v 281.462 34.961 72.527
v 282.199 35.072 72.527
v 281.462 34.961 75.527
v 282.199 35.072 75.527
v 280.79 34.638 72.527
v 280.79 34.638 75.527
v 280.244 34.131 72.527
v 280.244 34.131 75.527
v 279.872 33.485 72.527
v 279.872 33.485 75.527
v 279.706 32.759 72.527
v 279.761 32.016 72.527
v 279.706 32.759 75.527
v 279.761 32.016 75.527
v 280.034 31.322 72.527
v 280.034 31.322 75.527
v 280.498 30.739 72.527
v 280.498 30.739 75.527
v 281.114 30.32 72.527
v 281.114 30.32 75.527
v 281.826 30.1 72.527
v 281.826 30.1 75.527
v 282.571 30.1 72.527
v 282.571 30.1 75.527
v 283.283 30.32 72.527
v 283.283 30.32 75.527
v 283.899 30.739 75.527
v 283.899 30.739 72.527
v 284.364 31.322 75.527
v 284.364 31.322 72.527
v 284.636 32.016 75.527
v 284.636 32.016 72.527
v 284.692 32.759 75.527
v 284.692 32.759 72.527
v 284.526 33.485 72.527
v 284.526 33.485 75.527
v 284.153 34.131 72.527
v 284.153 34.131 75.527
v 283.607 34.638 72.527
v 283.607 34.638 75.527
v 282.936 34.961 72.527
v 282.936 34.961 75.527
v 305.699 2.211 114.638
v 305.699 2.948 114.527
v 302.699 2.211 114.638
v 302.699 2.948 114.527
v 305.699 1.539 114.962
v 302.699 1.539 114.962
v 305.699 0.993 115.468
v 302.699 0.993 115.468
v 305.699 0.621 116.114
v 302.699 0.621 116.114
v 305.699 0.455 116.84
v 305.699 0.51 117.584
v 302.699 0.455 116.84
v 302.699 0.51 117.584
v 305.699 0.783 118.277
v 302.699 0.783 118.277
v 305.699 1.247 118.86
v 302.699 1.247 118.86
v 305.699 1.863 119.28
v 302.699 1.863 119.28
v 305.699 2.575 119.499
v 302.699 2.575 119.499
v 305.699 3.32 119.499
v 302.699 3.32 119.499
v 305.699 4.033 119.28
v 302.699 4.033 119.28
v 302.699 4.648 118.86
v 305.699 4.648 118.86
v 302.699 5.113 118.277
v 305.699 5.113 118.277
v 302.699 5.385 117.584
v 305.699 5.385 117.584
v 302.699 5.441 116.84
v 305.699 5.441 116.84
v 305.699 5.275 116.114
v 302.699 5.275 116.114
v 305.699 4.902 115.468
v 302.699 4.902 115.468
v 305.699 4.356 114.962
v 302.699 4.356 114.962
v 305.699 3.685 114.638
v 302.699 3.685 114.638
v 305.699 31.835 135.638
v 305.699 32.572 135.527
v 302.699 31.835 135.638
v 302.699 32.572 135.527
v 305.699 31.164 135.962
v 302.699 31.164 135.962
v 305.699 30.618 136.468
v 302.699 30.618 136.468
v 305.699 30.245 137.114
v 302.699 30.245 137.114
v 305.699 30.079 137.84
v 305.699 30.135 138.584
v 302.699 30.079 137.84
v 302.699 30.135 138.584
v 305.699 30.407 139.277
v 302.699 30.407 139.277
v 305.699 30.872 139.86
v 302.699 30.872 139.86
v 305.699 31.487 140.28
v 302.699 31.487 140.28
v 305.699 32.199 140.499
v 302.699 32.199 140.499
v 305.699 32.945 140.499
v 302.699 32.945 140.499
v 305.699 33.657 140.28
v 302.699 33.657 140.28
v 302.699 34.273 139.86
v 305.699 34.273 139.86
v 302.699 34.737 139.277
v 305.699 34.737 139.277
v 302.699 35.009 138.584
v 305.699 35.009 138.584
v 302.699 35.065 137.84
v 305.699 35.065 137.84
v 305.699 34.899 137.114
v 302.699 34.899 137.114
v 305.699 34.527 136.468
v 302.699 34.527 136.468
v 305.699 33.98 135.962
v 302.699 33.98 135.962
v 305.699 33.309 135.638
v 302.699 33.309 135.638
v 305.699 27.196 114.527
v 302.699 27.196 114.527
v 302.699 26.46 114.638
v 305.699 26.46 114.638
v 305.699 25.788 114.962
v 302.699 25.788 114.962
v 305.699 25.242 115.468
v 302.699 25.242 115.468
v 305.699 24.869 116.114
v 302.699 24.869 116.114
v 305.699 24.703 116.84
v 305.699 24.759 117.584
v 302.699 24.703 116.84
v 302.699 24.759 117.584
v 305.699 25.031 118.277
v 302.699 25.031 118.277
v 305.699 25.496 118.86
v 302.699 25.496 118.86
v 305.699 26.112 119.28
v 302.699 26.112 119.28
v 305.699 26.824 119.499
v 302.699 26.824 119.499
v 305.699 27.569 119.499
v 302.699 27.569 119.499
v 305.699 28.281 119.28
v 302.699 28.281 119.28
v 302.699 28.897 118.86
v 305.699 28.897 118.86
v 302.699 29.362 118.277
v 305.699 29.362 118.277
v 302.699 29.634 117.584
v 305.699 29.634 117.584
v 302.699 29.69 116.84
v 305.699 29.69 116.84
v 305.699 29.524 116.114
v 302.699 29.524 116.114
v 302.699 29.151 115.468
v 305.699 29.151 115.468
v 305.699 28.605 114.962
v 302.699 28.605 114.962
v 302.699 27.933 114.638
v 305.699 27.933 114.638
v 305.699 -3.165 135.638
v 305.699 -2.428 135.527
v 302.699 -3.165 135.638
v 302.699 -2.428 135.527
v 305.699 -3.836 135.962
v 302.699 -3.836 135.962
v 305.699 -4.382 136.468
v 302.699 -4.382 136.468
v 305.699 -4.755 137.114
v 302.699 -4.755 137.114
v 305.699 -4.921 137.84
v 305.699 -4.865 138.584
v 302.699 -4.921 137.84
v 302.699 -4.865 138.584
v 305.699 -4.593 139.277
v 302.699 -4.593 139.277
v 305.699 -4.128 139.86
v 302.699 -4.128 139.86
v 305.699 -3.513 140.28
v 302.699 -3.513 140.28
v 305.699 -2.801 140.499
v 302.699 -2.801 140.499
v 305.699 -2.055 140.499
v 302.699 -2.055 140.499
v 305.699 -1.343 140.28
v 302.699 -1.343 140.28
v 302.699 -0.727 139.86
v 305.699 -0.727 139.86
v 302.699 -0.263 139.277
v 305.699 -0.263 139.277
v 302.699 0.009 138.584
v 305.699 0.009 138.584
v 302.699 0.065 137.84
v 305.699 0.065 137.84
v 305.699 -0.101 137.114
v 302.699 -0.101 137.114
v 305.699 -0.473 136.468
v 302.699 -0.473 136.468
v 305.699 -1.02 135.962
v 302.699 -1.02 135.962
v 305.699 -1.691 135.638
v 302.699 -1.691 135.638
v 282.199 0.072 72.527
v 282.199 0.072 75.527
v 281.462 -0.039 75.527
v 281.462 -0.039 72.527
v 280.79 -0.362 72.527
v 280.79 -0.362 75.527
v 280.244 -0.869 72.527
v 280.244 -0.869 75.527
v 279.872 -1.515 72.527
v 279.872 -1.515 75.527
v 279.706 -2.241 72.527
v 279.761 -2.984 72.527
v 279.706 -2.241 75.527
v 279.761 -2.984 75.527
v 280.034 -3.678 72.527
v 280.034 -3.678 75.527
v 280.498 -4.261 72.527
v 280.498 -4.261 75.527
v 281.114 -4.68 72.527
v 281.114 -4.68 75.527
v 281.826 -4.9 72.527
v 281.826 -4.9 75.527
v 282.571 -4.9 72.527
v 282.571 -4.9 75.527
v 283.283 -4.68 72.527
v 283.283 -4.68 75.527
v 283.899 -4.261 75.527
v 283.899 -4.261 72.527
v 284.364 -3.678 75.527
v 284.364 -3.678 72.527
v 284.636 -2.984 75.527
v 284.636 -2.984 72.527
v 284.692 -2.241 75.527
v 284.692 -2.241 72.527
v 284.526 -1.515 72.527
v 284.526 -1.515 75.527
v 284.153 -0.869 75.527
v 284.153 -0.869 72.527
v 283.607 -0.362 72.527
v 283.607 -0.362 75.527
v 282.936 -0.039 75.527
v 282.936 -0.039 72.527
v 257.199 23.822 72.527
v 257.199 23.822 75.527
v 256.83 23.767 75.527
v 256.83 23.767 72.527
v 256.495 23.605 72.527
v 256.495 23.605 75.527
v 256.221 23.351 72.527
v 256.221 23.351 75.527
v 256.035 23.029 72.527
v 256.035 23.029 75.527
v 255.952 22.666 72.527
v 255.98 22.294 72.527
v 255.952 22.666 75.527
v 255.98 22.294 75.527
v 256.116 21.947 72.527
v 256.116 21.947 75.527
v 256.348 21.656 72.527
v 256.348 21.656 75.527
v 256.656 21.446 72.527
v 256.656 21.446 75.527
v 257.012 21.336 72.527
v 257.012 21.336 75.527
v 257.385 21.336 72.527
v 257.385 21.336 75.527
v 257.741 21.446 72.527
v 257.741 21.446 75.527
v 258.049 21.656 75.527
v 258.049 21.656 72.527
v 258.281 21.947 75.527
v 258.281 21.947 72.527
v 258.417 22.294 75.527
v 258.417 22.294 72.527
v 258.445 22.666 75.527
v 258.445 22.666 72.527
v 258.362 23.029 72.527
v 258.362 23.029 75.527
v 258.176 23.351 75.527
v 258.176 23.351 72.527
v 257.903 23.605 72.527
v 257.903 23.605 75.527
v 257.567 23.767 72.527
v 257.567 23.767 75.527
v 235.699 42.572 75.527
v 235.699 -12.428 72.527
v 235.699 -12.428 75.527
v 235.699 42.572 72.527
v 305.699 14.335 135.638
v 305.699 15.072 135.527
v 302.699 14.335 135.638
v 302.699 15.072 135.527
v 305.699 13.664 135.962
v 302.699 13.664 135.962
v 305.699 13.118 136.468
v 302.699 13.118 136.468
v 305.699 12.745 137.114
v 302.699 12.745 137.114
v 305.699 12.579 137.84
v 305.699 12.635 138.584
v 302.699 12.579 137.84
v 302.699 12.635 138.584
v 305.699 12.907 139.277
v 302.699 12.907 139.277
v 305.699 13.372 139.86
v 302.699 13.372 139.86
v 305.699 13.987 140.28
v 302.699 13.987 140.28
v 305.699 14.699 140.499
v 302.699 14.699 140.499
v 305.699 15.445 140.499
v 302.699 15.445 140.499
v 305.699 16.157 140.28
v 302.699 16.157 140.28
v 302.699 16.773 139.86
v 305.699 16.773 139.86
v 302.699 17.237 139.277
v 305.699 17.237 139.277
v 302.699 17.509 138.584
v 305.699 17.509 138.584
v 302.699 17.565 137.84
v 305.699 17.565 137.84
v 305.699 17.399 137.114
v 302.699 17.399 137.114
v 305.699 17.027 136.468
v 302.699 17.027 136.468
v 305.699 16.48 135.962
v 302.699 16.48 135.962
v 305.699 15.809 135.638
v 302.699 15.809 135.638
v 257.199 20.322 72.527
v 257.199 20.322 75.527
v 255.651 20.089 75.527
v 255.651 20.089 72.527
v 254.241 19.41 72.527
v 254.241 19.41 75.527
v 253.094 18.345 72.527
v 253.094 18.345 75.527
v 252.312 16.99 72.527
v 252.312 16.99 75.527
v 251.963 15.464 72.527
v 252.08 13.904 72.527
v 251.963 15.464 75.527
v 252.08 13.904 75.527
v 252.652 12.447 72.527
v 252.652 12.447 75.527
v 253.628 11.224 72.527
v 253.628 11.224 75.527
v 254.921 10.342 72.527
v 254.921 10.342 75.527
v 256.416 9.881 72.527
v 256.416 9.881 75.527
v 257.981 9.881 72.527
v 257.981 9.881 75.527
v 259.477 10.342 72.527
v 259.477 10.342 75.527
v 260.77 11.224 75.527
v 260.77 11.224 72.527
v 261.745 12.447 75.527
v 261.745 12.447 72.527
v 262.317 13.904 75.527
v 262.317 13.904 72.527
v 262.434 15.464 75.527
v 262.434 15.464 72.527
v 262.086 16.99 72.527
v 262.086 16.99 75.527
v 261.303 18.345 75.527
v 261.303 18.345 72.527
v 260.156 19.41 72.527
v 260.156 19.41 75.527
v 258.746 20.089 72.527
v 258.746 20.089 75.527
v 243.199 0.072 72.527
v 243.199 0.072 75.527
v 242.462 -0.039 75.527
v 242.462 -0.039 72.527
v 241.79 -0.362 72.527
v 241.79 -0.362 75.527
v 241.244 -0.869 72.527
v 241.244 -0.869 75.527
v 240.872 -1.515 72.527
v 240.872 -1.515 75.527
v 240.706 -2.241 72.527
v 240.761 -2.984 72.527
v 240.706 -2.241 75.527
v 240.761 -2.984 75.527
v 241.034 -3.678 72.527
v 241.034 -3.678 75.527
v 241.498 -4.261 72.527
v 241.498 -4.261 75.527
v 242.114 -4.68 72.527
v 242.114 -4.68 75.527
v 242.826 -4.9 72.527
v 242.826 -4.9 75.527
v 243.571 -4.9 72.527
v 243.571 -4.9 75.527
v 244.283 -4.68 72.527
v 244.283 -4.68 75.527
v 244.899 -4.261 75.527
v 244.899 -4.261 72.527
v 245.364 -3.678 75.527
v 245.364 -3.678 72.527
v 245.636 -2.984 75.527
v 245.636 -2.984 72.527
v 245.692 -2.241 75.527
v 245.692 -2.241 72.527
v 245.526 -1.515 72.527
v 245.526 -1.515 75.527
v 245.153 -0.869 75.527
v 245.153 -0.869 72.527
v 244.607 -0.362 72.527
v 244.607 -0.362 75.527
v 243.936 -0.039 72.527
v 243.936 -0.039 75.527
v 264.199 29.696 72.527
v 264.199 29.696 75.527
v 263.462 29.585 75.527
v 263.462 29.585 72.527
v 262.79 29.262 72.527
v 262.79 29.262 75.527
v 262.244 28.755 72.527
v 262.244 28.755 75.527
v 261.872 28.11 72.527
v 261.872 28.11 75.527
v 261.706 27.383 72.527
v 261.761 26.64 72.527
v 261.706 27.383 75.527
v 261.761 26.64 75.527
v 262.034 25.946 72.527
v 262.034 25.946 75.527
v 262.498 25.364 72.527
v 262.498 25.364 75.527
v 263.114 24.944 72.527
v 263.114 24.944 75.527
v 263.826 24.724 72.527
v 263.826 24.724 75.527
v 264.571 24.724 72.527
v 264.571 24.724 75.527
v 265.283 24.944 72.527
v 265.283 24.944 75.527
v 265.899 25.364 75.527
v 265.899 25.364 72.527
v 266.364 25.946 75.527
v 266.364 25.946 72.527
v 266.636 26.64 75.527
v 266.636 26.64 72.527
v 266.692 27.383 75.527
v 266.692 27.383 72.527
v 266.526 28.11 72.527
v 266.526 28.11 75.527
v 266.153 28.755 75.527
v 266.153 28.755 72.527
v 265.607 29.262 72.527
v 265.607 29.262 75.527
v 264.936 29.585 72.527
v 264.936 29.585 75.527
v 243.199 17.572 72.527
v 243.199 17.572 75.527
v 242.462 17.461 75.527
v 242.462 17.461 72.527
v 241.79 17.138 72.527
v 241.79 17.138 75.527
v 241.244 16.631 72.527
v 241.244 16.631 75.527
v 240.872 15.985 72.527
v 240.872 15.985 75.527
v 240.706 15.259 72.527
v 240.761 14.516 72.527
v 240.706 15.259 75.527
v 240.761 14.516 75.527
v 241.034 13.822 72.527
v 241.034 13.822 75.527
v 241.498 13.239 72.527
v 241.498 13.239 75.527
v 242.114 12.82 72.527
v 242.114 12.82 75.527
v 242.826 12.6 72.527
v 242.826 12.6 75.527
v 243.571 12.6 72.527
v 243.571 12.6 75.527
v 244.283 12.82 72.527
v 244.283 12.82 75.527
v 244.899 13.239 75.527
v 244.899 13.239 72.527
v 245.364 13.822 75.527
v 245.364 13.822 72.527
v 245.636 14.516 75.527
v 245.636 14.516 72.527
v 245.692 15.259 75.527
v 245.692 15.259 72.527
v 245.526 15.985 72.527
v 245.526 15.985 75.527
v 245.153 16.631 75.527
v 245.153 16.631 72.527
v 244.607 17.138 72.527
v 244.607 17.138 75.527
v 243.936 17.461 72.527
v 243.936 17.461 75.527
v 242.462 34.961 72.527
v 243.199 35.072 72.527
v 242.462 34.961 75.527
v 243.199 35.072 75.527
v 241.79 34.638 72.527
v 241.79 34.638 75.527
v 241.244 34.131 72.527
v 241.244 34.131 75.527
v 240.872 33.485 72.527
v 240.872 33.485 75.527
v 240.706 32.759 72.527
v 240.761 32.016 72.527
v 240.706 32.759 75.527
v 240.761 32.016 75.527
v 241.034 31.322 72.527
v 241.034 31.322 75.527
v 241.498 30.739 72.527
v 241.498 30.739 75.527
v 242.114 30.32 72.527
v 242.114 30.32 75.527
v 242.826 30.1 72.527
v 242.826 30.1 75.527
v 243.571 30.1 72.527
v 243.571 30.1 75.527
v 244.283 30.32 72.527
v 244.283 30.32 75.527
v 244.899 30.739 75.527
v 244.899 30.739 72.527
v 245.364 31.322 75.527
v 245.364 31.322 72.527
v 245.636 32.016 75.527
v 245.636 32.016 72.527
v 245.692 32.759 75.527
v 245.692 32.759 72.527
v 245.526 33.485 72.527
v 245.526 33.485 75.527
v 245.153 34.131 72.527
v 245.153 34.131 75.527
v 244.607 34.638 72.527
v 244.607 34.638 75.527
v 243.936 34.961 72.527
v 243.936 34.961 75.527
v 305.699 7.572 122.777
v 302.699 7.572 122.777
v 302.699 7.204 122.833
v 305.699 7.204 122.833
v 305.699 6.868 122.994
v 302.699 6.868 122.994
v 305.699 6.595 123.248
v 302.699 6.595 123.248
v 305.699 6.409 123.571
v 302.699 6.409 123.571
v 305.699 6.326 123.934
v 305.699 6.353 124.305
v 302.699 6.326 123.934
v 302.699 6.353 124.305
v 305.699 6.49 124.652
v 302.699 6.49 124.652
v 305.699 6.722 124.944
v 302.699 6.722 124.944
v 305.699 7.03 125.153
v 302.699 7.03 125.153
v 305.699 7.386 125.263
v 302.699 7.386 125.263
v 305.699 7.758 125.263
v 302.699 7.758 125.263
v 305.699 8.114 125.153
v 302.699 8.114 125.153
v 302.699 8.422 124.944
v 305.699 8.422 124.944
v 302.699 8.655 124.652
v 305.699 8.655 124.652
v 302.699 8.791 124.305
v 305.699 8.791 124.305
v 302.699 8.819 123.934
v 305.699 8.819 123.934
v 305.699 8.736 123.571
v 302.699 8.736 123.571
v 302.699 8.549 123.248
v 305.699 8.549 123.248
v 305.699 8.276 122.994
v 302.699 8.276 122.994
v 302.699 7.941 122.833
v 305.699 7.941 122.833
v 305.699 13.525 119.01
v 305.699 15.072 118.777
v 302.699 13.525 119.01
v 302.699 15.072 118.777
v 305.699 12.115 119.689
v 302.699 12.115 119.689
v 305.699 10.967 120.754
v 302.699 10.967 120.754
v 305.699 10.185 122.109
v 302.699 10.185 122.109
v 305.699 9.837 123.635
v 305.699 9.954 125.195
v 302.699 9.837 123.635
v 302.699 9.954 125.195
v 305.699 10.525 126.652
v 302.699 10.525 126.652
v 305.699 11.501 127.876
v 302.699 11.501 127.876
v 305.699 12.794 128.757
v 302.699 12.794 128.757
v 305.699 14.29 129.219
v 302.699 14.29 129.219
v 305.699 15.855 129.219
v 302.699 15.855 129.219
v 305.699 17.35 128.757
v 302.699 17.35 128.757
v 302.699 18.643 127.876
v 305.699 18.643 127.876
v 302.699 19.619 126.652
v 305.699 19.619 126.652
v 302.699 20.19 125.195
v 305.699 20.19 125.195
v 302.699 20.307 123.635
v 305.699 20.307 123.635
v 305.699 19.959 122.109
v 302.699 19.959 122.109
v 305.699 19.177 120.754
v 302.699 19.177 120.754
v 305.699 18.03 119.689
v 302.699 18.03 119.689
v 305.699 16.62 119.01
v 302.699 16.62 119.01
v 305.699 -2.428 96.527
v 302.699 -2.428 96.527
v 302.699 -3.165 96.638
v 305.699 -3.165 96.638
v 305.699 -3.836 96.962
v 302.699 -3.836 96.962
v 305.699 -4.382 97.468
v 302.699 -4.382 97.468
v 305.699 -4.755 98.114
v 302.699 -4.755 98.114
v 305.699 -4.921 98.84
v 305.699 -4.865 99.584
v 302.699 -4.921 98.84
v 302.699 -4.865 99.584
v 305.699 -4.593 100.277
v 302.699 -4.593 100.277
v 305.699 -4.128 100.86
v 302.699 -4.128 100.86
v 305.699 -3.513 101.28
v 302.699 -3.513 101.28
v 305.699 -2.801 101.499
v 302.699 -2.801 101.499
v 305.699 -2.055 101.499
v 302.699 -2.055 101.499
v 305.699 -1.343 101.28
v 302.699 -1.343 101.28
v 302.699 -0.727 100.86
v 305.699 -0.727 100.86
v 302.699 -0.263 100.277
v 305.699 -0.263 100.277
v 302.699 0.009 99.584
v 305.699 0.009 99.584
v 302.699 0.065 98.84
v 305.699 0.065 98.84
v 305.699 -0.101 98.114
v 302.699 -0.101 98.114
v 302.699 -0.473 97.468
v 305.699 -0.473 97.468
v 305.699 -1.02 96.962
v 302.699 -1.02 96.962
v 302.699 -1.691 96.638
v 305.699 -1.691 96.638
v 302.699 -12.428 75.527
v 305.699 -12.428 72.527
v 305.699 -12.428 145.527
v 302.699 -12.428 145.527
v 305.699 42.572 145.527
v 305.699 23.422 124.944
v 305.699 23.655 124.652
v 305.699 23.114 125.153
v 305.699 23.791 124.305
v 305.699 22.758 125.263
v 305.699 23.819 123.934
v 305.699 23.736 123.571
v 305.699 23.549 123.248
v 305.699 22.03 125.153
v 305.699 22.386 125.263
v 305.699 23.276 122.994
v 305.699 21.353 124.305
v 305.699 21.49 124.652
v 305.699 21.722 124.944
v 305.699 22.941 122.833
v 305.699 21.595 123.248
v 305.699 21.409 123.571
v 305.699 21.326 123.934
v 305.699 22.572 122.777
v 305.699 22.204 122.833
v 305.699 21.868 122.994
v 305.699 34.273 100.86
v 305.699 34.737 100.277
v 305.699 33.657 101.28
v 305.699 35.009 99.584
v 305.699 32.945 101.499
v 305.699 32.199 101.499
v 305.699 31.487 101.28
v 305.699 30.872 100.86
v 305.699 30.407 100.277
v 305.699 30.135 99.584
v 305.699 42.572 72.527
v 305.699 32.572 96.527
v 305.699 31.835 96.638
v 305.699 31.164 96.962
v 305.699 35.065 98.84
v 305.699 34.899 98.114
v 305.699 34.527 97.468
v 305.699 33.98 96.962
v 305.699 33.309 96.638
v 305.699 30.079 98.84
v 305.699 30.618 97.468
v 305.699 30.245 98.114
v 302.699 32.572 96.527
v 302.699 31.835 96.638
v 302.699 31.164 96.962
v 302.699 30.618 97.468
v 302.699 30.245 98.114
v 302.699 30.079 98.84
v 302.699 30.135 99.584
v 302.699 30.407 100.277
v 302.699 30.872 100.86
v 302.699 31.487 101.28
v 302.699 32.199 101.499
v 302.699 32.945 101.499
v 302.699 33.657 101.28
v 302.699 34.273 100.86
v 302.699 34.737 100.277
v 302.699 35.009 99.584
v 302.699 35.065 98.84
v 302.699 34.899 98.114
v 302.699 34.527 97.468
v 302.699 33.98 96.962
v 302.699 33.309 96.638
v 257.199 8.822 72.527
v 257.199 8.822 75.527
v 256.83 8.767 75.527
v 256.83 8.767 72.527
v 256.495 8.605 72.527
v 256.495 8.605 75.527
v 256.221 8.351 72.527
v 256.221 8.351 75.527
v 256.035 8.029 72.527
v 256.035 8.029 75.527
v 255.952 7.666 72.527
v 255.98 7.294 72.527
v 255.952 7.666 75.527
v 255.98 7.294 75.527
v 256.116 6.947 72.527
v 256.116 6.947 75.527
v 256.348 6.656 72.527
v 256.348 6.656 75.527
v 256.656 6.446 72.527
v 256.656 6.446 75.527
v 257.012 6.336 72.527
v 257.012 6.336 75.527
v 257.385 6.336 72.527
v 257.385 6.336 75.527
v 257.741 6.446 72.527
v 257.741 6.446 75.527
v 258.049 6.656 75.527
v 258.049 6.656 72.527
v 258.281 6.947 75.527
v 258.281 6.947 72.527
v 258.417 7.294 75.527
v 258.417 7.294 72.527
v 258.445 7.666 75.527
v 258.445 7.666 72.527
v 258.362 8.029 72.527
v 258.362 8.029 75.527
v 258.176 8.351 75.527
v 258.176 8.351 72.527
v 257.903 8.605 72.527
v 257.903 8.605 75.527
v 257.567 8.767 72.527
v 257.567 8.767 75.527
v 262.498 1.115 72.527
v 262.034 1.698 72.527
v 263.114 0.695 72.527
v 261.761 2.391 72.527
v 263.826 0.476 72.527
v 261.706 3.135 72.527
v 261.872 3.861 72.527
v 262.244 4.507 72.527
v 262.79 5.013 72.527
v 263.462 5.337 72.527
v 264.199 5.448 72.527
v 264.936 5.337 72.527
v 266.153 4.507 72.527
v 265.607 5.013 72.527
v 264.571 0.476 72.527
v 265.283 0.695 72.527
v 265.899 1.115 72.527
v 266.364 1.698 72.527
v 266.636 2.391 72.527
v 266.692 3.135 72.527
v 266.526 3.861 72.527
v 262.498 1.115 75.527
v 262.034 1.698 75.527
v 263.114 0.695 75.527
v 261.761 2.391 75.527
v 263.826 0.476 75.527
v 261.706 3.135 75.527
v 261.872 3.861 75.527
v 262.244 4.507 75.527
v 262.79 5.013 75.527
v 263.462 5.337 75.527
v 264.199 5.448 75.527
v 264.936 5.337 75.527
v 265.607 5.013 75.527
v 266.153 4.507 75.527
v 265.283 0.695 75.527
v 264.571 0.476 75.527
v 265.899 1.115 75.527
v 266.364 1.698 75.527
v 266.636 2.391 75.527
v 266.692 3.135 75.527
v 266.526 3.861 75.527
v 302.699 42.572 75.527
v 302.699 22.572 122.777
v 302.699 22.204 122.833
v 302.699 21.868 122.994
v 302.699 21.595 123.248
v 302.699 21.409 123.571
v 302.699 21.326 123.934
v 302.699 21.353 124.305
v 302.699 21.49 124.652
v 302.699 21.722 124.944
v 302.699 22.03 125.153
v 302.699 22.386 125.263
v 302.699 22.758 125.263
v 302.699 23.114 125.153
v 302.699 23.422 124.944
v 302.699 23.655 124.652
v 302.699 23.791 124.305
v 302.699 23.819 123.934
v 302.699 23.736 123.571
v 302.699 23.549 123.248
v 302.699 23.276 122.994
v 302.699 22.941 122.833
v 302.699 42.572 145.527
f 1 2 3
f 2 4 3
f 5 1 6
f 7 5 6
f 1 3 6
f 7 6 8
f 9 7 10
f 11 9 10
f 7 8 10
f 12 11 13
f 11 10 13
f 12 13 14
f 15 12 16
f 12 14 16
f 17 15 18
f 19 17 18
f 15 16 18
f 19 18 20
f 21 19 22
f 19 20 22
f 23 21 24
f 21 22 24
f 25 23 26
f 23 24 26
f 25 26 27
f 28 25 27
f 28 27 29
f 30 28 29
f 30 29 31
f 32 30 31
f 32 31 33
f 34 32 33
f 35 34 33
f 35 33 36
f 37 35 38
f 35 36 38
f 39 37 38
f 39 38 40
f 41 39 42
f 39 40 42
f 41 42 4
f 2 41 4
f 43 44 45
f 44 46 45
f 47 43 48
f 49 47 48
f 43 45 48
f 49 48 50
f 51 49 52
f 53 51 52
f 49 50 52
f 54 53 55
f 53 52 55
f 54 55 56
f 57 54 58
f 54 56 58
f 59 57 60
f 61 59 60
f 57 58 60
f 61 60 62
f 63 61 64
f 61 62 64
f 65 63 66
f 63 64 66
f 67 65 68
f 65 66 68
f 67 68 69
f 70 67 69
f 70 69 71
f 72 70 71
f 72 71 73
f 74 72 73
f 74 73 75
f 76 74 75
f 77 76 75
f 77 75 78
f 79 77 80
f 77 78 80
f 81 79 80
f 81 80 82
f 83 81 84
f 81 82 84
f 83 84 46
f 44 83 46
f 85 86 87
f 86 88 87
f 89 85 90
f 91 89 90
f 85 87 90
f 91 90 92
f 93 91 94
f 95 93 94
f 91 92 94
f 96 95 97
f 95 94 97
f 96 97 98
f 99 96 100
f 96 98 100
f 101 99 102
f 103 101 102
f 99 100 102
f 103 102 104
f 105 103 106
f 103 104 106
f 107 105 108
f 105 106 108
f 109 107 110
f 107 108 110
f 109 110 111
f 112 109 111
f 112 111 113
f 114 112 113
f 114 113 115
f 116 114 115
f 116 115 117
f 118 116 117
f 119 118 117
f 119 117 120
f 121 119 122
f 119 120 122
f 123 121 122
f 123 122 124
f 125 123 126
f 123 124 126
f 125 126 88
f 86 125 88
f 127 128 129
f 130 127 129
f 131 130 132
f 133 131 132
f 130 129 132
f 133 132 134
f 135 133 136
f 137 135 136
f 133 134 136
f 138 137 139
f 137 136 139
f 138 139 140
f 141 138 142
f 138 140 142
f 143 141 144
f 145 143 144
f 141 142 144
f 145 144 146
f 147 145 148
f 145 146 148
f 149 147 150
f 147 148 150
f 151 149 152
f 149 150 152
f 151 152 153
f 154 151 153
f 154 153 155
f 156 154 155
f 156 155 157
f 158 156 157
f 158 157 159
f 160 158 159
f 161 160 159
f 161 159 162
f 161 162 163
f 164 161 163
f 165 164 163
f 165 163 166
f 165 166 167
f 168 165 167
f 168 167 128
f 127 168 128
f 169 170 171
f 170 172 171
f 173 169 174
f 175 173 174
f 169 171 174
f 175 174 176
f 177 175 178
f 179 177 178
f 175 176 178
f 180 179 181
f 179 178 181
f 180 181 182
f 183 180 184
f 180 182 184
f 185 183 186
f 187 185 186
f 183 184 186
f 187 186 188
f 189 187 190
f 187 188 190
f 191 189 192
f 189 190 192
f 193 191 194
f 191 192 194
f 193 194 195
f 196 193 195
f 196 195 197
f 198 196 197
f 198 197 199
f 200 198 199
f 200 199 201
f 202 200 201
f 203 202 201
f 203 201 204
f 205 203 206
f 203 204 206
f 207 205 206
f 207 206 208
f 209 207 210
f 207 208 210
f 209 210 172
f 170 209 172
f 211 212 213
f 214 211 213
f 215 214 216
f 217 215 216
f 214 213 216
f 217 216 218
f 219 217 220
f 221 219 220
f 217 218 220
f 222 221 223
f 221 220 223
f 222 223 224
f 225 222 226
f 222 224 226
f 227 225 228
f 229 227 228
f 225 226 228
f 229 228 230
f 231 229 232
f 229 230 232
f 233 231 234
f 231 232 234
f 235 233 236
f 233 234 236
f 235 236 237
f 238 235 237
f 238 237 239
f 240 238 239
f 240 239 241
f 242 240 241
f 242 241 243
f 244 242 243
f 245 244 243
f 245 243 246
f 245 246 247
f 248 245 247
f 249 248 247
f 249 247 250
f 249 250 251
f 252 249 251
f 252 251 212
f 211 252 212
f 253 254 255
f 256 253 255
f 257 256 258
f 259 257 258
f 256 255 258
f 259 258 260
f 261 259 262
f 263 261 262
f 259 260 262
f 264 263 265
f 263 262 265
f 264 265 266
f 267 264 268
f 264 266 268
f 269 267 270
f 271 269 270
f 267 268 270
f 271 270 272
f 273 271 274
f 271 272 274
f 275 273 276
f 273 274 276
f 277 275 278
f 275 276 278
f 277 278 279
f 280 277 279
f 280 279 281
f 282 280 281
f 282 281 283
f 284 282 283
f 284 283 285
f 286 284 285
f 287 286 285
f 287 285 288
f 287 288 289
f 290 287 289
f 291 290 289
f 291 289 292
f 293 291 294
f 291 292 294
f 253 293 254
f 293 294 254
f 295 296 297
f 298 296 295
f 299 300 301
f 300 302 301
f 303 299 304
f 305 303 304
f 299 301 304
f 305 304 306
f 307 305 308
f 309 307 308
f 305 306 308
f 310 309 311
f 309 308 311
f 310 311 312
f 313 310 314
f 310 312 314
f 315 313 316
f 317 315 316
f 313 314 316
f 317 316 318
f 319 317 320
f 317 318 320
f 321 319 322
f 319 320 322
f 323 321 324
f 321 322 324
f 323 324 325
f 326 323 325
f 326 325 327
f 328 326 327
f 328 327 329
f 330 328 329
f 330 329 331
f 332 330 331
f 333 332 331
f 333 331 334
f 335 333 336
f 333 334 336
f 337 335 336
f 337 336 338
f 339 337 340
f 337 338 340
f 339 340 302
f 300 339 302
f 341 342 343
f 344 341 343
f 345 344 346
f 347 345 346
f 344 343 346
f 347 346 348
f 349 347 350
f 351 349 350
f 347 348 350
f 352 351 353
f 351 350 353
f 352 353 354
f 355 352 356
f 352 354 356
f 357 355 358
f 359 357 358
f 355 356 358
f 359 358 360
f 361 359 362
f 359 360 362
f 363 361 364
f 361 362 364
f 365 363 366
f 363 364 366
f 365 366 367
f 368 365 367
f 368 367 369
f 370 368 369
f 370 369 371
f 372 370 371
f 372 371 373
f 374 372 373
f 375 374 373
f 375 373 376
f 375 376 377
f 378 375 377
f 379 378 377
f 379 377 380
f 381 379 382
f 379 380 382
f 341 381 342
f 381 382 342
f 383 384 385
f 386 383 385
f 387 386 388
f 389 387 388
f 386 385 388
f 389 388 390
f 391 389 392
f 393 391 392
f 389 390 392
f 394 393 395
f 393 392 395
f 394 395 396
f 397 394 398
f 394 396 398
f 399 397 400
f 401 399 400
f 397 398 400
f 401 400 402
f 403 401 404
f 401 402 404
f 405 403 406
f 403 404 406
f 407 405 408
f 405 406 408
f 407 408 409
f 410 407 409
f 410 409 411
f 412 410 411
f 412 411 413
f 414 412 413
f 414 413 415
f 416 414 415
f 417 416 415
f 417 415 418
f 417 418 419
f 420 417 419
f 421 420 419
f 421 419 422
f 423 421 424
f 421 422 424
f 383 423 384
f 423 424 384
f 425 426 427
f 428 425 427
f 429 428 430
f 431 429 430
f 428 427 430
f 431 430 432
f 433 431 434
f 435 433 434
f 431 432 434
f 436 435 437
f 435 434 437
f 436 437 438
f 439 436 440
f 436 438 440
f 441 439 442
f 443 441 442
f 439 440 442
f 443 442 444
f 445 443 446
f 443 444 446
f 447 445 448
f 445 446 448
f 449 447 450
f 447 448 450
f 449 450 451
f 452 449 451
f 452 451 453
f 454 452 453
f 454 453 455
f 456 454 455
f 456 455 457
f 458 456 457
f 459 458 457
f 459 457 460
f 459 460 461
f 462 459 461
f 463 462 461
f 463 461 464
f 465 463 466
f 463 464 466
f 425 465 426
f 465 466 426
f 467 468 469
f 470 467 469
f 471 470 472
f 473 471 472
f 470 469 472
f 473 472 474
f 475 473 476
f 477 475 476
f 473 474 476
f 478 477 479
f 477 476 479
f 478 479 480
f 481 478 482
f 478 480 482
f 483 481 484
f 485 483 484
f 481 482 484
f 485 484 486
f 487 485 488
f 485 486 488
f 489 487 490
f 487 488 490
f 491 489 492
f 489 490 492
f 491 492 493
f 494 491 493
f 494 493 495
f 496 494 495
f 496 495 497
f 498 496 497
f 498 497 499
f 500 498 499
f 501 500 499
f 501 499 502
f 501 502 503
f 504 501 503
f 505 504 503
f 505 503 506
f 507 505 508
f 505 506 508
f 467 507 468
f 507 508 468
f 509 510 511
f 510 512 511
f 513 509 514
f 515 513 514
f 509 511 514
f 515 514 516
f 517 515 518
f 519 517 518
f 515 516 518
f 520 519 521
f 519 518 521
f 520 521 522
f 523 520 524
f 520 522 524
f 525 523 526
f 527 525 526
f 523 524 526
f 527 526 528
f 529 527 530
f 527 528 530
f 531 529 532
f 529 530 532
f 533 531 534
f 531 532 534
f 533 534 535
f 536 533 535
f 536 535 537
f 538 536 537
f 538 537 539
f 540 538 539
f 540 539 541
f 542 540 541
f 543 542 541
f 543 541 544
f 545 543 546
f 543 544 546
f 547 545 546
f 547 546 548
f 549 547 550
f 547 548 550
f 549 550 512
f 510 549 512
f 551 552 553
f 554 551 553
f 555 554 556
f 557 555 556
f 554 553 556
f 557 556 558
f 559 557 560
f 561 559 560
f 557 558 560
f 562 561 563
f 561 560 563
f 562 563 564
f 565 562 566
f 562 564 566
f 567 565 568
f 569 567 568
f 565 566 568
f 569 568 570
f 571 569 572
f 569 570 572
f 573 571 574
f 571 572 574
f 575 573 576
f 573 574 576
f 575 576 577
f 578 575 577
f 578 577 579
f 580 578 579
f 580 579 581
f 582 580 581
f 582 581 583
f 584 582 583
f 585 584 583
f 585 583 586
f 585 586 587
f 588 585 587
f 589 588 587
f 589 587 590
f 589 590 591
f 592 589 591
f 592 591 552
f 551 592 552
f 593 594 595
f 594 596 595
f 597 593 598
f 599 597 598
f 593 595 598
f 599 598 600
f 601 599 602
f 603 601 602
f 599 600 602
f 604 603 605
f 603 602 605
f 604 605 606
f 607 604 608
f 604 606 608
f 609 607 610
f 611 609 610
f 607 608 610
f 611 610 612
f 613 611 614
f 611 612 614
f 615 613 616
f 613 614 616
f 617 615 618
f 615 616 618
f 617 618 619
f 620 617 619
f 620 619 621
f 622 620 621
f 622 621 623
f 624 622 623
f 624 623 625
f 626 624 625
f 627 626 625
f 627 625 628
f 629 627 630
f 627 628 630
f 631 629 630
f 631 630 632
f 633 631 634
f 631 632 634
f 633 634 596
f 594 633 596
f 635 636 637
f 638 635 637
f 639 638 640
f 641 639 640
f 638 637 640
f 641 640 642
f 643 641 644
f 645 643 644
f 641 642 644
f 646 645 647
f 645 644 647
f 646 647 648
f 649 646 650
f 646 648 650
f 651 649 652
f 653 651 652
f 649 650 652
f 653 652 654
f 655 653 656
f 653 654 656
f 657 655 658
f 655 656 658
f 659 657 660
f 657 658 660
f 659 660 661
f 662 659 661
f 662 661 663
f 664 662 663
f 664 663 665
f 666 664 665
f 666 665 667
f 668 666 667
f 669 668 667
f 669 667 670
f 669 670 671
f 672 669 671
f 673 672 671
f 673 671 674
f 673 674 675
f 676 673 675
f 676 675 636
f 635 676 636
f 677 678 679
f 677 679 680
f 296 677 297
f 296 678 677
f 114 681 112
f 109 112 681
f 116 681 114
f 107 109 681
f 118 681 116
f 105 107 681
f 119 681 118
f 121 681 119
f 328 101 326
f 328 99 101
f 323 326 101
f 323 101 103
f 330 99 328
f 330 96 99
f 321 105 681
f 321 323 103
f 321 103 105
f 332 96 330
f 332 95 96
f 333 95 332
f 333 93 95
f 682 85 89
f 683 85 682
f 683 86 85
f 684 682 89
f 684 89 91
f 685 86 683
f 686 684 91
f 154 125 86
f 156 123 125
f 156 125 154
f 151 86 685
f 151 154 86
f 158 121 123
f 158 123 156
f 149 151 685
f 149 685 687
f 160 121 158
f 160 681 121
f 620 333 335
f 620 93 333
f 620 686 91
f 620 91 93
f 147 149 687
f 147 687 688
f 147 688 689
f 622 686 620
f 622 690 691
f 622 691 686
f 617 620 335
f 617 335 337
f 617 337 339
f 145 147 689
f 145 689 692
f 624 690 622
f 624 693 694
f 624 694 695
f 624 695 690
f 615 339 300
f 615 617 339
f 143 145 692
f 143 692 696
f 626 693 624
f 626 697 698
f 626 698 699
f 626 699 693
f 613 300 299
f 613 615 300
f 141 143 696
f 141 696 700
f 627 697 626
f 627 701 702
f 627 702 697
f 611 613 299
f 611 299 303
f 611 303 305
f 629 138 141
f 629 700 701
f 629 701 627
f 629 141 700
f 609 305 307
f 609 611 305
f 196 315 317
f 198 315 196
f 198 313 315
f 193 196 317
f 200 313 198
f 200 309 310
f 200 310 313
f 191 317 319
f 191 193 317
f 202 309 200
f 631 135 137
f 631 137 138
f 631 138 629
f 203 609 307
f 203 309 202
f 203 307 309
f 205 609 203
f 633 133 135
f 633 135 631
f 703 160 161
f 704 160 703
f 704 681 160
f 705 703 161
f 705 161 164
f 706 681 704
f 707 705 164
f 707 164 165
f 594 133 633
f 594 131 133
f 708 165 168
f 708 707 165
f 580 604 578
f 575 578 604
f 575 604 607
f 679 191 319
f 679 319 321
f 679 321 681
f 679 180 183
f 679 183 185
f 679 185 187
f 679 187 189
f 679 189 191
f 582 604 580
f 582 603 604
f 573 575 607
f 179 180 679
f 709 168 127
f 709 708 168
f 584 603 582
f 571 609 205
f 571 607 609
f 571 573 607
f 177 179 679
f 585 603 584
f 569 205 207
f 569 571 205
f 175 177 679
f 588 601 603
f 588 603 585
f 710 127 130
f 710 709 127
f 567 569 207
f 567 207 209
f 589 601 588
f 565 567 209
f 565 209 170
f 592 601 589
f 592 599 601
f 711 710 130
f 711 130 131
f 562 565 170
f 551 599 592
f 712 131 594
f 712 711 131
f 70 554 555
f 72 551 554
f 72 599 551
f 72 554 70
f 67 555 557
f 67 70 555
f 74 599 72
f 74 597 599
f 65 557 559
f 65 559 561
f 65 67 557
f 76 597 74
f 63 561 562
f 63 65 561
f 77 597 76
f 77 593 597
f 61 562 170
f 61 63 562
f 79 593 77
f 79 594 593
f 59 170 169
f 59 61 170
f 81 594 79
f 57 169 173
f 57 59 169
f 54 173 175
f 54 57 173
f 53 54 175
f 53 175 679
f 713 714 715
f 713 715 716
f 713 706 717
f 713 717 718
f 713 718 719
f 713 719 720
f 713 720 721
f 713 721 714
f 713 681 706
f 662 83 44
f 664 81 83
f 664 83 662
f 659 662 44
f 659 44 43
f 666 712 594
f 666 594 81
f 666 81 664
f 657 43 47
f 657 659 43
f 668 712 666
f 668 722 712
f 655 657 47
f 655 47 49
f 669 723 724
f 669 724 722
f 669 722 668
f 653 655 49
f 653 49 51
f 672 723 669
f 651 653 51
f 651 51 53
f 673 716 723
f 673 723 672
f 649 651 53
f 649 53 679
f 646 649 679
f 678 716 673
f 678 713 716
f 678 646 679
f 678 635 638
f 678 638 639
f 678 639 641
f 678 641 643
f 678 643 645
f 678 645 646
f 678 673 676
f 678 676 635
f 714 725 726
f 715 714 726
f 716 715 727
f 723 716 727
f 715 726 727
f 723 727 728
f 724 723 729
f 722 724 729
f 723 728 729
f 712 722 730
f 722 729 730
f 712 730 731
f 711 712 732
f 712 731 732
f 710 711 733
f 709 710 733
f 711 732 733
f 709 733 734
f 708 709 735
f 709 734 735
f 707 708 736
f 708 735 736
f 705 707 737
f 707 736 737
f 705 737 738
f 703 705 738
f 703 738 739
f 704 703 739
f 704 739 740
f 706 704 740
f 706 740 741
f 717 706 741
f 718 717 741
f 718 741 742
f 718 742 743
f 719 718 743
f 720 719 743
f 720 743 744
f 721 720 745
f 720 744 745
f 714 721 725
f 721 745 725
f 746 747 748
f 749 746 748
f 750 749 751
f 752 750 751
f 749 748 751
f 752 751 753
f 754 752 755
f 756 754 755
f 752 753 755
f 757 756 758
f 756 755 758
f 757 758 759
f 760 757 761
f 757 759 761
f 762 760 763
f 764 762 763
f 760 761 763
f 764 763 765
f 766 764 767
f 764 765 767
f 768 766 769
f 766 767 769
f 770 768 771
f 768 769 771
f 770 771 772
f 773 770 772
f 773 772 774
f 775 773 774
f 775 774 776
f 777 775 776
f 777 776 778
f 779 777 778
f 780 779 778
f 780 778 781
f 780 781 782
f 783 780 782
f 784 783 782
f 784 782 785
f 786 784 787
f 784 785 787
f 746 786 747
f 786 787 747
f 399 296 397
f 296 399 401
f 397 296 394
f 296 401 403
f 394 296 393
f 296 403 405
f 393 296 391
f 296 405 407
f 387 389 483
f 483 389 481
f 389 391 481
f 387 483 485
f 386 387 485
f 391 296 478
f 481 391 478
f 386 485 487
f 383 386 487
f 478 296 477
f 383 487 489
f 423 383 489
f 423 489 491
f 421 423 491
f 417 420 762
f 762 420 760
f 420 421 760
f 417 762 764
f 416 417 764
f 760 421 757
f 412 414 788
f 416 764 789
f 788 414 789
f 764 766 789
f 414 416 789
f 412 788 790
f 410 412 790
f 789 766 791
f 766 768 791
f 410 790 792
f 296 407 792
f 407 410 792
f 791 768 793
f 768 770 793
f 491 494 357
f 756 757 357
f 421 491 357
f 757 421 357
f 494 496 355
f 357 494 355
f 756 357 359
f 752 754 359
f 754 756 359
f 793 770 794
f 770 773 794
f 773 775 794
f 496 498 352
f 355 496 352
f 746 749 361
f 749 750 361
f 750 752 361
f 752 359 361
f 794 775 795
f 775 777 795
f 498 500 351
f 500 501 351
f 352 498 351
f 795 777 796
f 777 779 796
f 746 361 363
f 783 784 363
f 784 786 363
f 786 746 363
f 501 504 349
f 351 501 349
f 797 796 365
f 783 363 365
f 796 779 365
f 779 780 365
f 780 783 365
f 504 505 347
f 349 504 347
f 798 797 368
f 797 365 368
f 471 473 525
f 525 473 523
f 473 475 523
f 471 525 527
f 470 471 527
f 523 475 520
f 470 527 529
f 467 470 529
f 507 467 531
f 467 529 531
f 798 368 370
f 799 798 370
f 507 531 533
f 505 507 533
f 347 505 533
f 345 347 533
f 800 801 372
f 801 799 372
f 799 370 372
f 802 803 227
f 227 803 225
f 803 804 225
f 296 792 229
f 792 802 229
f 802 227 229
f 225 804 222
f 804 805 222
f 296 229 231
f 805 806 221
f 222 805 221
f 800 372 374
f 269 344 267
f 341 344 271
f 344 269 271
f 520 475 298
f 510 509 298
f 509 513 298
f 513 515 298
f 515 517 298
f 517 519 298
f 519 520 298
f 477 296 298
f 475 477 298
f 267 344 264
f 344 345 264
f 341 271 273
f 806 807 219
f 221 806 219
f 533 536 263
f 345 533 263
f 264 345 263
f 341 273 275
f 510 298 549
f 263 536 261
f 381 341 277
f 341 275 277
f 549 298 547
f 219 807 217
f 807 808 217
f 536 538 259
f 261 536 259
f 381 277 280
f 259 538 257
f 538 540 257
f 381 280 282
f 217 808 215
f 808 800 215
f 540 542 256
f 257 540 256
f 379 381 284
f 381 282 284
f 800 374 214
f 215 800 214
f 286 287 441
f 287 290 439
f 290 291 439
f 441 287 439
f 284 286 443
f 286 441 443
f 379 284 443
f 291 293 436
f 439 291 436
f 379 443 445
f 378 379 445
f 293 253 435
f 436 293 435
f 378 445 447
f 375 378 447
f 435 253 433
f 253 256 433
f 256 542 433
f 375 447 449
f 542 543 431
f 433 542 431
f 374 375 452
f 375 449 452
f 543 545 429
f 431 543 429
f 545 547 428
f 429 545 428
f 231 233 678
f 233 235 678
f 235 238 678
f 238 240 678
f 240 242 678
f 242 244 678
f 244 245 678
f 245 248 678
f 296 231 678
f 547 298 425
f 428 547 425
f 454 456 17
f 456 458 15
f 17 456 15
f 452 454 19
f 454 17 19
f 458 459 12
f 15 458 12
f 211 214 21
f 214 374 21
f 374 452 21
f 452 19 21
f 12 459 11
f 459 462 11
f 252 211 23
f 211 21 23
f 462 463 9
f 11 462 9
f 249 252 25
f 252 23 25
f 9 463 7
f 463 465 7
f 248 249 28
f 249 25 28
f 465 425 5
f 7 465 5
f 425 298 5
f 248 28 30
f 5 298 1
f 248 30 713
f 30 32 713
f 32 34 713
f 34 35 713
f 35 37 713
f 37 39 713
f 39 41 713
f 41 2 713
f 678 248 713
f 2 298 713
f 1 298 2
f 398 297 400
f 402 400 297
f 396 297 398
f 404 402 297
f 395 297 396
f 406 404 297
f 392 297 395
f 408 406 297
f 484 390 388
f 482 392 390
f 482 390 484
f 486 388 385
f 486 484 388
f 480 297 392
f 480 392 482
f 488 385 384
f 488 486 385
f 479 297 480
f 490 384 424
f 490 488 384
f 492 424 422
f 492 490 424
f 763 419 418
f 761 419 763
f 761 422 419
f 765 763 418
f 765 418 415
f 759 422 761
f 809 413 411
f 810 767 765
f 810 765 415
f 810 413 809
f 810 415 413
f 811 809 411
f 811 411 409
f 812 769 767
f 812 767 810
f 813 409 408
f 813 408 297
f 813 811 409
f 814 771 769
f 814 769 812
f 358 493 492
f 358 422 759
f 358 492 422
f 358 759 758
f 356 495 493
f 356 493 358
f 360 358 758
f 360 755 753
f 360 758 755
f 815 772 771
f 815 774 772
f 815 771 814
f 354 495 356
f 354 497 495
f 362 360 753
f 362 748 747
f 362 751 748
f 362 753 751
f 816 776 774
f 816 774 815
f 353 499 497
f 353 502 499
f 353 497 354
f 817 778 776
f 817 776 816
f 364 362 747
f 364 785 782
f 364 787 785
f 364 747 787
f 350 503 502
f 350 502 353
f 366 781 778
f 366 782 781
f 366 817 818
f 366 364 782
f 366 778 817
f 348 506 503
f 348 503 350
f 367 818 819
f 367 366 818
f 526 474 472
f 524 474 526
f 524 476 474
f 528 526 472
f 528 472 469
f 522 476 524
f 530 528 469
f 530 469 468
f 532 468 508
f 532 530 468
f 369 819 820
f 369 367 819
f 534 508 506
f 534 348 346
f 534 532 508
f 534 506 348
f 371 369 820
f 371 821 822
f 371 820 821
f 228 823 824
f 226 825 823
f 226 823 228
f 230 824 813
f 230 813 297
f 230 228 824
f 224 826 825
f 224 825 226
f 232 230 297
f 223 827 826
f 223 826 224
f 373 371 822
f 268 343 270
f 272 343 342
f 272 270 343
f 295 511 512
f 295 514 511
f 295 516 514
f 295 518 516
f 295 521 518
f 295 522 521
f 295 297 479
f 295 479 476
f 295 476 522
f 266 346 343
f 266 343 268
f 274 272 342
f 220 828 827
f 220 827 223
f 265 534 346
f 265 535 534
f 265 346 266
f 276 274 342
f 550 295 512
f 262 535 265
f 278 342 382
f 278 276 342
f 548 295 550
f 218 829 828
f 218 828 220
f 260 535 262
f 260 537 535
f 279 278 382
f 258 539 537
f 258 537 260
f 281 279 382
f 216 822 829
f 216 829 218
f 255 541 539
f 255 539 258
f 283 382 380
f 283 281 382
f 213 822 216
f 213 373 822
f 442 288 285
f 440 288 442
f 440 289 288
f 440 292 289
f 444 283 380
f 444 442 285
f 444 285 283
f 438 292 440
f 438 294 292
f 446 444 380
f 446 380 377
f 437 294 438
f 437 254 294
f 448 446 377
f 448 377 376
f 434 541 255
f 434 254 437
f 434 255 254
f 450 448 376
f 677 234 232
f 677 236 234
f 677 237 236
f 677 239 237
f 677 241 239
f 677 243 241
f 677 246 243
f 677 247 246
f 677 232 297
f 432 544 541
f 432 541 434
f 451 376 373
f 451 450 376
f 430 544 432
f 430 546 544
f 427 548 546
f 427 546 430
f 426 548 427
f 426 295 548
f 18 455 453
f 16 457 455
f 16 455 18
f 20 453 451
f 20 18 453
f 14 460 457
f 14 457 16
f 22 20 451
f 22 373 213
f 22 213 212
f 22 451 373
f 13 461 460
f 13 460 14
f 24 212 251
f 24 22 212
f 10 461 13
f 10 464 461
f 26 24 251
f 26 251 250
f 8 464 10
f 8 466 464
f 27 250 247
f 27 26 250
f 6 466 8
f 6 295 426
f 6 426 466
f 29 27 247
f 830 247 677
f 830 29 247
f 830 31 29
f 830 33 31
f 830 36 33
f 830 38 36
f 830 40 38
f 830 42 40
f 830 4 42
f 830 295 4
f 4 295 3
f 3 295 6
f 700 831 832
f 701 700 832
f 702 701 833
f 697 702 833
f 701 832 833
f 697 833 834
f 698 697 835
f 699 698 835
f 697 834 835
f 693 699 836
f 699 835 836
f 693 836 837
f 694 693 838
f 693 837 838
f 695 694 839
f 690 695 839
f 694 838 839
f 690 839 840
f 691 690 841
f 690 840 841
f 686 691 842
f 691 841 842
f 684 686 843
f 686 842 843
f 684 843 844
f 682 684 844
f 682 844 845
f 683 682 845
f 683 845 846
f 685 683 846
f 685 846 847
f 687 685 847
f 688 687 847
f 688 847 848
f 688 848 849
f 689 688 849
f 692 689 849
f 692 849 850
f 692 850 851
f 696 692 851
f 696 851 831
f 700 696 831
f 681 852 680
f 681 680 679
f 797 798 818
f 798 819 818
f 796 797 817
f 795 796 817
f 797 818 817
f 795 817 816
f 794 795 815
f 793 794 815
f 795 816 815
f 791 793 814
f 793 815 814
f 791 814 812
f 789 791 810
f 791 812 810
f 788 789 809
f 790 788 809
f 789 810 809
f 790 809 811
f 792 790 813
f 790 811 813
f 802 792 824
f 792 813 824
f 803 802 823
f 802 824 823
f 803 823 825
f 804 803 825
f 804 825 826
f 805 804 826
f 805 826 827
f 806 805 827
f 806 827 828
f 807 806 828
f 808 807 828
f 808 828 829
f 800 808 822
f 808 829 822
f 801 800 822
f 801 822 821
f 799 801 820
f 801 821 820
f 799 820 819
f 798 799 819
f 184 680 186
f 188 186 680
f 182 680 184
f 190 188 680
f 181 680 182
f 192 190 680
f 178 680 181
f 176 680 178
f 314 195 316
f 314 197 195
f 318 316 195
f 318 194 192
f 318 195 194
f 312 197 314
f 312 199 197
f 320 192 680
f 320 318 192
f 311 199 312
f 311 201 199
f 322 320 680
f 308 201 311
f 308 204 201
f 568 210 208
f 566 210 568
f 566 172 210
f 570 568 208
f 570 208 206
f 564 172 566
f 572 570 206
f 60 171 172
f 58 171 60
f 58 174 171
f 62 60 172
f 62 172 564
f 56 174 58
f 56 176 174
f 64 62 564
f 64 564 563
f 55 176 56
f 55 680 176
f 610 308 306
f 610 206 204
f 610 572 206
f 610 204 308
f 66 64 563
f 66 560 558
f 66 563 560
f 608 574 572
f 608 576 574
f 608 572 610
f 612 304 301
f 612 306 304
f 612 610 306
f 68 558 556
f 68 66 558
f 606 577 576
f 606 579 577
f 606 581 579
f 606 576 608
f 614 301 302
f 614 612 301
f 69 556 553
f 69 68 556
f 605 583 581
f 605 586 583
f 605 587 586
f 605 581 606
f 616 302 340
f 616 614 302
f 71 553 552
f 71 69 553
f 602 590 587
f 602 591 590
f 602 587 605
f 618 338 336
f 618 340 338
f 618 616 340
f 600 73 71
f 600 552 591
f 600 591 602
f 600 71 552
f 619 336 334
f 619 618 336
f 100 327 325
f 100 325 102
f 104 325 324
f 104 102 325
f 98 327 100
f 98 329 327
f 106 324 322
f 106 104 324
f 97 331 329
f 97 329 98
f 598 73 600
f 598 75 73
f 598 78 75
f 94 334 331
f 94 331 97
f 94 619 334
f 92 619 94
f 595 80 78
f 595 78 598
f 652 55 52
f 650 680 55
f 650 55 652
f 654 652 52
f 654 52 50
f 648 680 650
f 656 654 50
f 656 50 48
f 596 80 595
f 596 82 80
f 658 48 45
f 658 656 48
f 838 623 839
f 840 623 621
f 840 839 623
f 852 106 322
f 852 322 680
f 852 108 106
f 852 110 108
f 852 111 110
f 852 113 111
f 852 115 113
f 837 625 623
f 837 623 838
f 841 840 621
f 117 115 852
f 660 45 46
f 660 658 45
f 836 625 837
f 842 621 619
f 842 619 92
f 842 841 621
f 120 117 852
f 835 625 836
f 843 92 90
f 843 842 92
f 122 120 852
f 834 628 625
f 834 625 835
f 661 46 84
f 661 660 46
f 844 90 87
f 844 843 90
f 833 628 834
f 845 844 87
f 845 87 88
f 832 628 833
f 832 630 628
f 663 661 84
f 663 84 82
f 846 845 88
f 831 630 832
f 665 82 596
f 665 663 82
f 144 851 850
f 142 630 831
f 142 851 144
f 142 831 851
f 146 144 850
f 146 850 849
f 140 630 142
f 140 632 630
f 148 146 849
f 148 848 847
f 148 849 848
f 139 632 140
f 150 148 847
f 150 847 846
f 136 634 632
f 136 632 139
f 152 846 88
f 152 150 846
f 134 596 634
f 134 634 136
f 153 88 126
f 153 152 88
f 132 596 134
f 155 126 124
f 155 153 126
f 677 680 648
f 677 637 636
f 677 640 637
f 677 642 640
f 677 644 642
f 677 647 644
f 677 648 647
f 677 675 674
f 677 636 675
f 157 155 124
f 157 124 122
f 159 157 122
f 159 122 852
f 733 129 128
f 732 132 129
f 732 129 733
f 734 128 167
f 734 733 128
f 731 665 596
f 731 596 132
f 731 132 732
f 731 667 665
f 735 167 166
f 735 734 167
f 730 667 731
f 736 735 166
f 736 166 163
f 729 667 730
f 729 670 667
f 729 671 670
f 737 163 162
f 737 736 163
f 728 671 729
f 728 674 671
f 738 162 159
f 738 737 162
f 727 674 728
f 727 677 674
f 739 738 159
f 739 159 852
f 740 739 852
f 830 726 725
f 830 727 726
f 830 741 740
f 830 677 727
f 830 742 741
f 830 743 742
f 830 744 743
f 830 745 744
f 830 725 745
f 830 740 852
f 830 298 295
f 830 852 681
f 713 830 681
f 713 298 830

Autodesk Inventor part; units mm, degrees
ref_plane "YZ Plane" through (0, 0, 0) normal (1, 0, 0) x (0, 1, 0)
ref_plane "XZ Plane" through (0, 0, 0) normal (0, 1, 0) x (-1, 0, 0)
ref_plane "Work Plane1" through (218.6643, -82.569, 72.5272) normal (0, 0, 1) x (1, 0, 0)
sketch "Sketch1" plane through (218.6643, -82.569, 72.5272) normal (0, 0, 1) x (1, 0, 0)
  line L0 (17.0344, 125.1412) -> (87.0344, 125.1412)
  line L1 (87.0344, 125.1412) -> (87.0344, 70.1412)
  line L2 (87.0344, 70.1412) -> (17.0344, 70.1412)
  line L3 (17.0344, 70.1412) -> (17.0344, 125.1412)
  point P0 (-218.6643, 82.569)
  dimension "Floor_Len" = 70
  dimension "Floor_Wid" = 55
extrude "Extrusion1" add sketch "Sketch1" along normal blind 3
sketch "Sketch2" plane through (218.6643, -82.569, 75.5272) normal (0, 0, 1) x (1, 0, 0)
  line L0 (17.0344, 70.1412) -> (87.0344, 70.1412) projected
  line L1 (87.0344, 125.1412) -> (17.0344, 125.1412) projected
  line L2 (87.0344, 70.1412) -> (84.0344, 70.1412)
  line L3 (84.0344, 70.1412) -> (84.0344, 125.1412)
  line L4 (84.0344, 125.1412) -> (87.0344, 125.1412)
  line L5 (87.0344, 125.1412) -> (87.0344, 70.1412)
  point P0 (-218.6643, 82.569)
  dimension "Tall_Thick" = 3
extrude "Extrusion2" add sketch "Sketch2" along normal blind 70
sketch "Sketch3" plane through (305.6987, -12.4279, 72.5272) normal (1, 0, 0) x (0, 0, -1)
  line L0 (0, 55) -> (-73, 55) projected
  line L1 (-73, 0) -> (-73, 55) projected
  point P0 (72.5272, 12.4279)
  point P1 (-51.5, 27.5)
  dimension "d40" = 21.5
  dimension "d41" = 27.5
hole "Hole1" at (305.6987, 15.0721, 124.0272) direction (-1, 0, 0) diameter 10.5 end through all
sketch "Sketch4" plane through (305.6987, -12.4279, 72.5272) normal (1, 0, 0) x (0, 0, -1)
  circle A0 centre (-51.5, 27.5) radius 5.3956
  circle A1 centre (-51.5, 27.5) radius 5.25 projected
  point P0 (72.5272, 12.4279)
  point P1 (-51.5, 20)
  point P2 (-51.5, 35)
  dimension "d46" = 7.5
  dimension "d47" = 7.5
hole "Hole2" at (305.6987, 7.5721, 124.0272) at (305.6987, 22.5721, 124.0272) direction (-1, 0, 0) diameter 2.5 end through all
sketch "Sketch5" plane through (305.6987, -12.4279, 72.5272) normal (1, 0, 0) x (0, 0, -1)
  circle A0 centre (-51.5, 27.5) radius 5.2922
  circle A1 centre (-51.5, 27.5) radius 5.25 projected
  line L0 (-65.5, 27.5) -> (-44.5, 39.6244)
  line L1 (-44.5, 39.6244) -> (-44.5, 15.3756)
  line L2 (-44.5, 15.3756) -> (-65.5, 27.5)
  point P0 (-65.5, 10)
  point P1 (-65.5, 45)
  point P2 (-26.5, 10)
  point P3 (-26.5, 45)
  dimension "d42" = 14
  dimension "d43" = 17.5
  dimension "d44" = 17.5
  dimension "d45" = 39
hole "Hole3" at (305.6987, -2.4279, 138.0272) at (305.6987, -2.4279, 99.0272) at (305.6987, 32.5721, 99.0272) at (305.6987, 32.5721, 138.0272) at (305.6987, 15.0721, 138.0272) at (305.6987, 2.9478, 117.0272) at (305.6987, 27.1965, 117.0272) direction (-1, 0, 0) diameter 5 end through all
sketch "Sketch6" plane through (242.6987, 66.5721, 72.5272) normal (0, 0, -1) x (0, 1, 0)
  line L0 (-24, -7) -> (-79, -7) projected
  line L1 (-24, 63) -> (-24, -7) projected
  point P0 (72.5272, 12.4279)
  point P1 (-51.5, 14.5)
  dimension "d77" = 21.5
  dimension "d78" = 27.5
hole "Hole4" at (257.1987, 15.0721, 72.5272) direction (0, 0, 1) diameter 10.5 end through all
sketch "Sketch7" plane through (270.6987, 15.0721, 72.5272) normal (0, 0, -1) x (-1, 0, 0)
  circle A0 centre (13.5, 0) radius 5.3956
  circle A1 centre (13.5, 0) radius 5.25 projected
  point P0 (72.5272, 12.4279)
  point P1 (13.5, -7.5)
  point P2 (13.5, 7.5)
  dimension "d59" = 7.5
  dimension "d58" = 7.5
hole "Hole5" at (257.1987, 7.5721, 72.5272) at (257.1987, 22.5721, 72.5272) direction (0, 0, 1) diameter 2.5 end through all
sketch "Sketch8" plane through (270.6987, 15.0721, 72.5272) normal (0, 0, -1) x (-1, 0, 0)
  line L0 (35, -27.5) -> (-32, -27.5) projected
  circle A0 centre (13.5, 0) radius 5.25
  circle A1 centre (13.5, 0) radius 5.25 projected
  line L1 (27.5, 0) -> (6.5, -12.1244)
  line L2 (6.5, -12.1244) -> (6.5, 12.1244)
  line L3 (6.5, 12.1244) -> (27.5, 0)
  point P0 (27.5, 17.5)
  point P1 (27.5, -17.5)
  point P2 (-11.5, 17.5)
  point P3 (-11.5, -17.5)
  dimension "d79" = 17.5
  dimension "d80" = 17.5
  dimension "d82" = 39
  dimension "d83" = 10
  dimension "d84" = 10.5
  dimension "d85" = 14
hole "Hole6" at (243.1987, 15.0721, 72.5272) at (243.1987, 32.5721, 72.5272) at (282.1987, 32.5721, 72.5272) at (282.1987, -2.4279, 72.5272) at (243.1987, -2.4279, 72.5272) at (264.1987, 27.1965, 72.5272) at (264.1987, 2.9478, 72.5272) direction (0, 0, 1) diameter 5 end through all
equation "\"d41\" = 0.5 * Floor_Wid"
equation "\"d78\" = 0.5 * Floor_Wid"
properties part number "Metal Braket" material "Aluminum 6061"
